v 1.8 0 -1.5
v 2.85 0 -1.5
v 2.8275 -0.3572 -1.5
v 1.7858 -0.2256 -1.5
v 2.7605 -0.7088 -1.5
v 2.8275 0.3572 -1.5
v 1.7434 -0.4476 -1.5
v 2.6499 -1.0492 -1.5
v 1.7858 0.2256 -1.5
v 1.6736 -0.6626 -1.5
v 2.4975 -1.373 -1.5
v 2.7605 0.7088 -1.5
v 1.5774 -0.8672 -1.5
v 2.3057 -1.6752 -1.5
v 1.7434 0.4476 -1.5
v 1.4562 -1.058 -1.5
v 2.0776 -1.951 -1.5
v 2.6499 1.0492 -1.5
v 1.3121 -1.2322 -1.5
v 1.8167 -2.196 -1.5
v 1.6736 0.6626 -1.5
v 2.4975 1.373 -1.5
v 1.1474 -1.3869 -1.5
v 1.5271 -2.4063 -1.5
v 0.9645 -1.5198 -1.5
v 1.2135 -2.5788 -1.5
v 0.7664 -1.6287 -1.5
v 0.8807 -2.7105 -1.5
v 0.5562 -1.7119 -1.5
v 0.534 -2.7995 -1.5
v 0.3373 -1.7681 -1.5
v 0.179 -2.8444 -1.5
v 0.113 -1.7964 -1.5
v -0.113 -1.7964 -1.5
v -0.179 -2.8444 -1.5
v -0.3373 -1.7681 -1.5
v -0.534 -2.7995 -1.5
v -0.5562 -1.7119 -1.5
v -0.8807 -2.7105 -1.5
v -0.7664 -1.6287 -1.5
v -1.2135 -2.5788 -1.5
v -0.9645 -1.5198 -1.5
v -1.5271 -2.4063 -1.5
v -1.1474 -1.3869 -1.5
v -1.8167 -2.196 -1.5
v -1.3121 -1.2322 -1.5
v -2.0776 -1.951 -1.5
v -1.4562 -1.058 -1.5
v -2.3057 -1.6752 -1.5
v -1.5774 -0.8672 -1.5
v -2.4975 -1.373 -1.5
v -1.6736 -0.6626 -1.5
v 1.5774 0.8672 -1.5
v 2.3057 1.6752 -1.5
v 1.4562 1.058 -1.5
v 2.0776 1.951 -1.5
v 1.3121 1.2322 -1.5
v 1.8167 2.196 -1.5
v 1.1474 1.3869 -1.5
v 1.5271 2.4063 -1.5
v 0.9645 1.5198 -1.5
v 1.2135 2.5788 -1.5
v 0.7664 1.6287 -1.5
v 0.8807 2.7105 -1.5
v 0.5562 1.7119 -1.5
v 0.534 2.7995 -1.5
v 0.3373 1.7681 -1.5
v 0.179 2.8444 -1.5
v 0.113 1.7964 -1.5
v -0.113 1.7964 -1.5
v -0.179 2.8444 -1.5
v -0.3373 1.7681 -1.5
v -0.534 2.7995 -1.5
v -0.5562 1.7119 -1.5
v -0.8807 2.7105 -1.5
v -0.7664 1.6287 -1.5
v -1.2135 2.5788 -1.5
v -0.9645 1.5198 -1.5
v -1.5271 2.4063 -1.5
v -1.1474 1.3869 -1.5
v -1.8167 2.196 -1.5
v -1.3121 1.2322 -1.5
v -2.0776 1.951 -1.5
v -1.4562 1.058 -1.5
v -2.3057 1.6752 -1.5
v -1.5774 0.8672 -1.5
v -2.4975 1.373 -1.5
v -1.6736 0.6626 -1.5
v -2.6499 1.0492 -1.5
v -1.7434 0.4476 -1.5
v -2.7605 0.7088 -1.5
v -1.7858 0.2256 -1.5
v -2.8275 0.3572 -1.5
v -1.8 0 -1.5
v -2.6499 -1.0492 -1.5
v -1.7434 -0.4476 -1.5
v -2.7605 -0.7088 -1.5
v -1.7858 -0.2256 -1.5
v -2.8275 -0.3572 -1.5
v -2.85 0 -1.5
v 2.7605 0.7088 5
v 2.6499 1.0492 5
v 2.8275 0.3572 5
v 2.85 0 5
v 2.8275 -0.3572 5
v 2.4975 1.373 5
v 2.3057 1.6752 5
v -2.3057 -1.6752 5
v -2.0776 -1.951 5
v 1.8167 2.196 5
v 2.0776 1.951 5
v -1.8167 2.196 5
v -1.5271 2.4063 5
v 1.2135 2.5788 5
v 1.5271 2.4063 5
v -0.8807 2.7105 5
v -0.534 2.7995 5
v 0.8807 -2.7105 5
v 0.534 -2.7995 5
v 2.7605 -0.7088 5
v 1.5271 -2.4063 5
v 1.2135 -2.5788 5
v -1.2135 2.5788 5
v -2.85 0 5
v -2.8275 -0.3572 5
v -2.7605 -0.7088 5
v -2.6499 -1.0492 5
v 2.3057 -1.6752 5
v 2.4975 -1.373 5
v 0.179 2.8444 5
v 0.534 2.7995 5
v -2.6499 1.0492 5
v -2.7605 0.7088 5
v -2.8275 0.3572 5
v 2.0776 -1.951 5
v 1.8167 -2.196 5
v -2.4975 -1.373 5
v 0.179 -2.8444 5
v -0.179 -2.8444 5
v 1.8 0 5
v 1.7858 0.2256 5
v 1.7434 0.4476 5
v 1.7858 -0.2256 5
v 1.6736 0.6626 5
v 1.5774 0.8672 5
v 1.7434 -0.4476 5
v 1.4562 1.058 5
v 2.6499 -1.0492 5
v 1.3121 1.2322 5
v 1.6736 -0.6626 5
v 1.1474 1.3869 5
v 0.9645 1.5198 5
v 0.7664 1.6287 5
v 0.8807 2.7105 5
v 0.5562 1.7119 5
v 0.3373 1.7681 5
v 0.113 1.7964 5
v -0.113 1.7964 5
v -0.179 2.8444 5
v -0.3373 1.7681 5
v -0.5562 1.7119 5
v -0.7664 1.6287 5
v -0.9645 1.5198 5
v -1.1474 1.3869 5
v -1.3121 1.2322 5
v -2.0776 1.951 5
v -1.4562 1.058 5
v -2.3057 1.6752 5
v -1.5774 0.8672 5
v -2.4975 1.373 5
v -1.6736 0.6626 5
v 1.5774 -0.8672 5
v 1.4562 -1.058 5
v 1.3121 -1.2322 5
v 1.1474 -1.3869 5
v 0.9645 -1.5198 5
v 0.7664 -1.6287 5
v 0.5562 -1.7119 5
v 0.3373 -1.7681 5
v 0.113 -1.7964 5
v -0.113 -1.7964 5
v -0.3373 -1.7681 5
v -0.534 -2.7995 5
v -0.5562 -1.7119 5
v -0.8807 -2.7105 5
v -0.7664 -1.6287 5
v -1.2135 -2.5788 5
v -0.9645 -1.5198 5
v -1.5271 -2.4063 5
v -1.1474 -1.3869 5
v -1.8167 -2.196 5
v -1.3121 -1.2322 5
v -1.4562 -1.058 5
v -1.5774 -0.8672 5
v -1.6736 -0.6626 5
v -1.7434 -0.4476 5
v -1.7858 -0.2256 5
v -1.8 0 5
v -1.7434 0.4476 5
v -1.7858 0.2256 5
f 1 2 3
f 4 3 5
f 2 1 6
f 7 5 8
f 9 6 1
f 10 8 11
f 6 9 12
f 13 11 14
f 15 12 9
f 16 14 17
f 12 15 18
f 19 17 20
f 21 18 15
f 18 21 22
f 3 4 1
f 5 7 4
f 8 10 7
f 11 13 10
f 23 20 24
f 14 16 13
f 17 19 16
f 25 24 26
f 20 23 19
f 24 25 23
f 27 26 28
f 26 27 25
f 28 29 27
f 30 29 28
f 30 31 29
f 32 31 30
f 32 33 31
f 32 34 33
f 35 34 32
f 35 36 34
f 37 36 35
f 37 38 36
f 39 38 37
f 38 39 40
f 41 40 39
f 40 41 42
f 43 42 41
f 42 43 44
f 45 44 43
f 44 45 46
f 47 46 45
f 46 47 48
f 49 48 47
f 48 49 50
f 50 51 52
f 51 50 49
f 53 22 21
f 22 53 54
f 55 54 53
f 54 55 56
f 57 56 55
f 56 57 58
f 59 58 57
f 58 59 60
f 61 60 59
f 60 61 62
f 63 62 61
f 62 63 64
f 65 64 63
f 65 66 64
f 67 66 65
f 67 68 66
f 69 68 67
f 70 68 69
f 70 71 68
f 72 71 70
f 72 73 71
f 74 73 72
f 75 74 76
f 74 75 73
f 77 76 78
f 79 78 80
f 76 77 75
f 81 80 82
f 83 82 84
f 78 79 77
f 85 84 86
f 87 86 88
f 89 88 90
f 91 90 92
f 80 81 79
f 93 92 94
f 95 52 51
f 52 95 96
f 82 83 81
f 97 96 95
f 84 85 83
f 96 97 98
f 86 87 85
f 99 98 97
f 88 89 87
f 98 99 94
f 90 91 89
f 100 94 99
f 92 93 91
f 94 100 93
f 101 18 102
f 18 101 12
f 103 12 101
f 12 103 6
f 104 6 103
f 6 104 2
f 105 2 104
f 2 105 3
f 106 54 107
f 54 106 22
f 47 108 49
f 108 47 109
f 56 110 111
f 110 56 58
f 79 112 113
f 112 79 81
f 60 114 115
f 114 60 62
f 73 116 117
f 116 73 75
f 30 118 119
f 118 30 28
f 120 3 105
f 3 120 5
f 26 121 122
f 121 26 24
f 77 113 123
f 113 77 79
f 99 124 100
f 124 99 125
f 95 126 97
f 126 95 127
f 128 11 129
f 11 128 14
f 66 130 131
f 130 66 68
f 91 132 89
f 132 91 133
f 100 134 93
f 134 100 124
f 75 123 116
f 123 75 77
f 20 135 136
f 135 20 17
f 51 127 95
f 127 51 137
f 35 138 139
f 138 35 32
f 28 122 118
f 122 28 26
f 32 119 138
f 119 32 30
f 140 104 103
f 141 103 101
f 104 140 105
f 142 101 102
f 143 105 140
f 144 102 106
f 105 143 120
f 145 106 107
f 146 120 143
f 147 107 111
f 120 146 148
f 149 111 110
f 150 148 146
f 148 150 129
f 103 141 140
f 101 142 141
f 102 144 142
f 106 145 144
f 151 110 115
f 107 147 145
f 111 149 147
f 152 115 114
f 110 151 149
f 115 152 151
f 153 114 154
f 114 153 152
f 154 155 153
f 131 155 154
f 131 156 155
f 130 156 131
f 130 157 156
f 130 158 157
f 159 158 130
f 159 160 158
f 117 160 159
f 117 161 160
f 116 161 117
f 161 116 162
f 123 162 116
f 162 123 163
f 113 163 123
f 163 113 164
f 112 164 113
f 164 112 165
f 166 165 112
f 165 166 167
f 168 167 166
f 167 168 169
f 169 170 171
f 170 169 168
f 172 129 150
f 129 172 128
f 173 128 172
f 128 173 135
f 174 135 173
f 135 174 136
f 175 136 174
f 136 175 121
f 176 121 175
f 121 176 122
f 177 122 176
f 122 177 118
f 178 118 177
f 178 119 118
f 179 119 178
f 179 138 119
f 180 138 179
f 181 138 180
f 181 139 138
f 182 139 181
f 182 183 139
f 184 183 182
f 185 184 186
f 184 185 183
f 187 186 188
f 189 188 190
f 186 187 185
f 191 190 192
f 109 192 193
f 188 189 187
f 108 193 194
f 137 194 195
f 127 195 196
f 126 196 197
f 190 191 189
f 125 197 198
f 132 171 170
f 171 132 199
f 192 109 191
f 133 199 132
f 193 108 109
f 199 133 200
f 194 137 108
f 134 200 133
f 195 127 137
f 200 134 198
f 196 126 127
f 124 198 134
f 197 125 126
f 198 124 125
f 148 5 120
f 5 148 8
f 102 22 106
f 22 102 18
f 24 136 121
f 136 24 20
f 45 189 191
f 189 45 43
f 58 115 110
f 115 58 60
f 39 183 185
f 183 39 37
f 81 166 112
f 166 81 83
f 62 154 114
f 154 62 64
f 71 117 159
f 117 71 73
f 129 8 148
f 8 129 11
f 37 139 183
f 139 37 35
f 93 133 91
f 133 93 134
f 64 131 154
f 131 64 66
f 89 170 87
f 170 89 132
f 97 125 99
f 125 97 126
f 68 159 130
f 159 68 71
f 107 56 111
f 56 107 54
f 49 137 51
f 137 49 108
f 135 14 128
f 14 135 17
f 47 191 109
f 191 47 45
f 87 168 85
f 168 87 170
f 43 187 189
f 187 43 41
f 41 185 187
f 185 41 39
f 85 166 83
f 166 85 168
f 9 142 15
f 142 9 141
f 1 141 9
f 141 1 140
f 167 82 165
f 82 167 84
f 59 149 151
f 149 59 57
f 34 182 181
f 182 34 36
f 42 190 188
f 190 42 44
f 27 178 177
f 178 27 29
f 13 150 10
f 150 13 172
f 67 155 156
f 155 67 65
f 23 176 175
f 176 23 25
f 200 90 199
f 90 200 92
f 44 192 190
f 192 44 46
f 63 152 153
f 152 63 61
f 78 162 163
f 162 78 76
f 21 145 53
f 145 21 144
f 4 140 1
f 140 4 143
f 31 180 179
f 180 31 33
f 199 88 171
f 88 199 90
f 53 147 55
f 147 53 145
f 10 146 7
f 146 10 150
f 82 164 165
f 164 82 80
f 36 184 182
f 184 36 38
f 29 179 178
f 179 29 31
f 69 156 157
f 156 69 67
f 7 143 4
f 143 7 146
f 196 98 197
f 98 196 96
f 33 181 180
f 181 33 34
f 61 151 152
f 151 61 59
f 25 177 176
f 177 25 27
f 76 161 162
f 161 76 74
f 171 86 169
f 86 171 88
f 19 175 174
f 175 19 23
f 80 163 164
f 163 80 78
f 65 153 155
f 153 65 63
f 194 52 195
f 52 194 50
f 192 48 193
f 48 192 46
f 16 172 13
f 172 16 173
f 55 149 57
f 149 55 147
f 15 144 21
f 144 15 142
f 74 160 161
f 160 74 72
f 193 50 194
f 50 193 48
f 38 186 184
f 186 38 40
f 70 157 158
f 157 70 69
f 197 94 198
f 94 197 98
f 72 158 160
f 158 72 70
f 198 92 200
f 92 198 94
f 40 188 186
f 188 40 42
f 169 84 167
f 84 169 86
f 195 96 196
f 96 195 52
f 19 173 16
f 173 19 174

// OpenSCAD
$fn = 50;


difference() {
	union() {
		translate(v = [0, 0, -1.5000000000]) {
			cylinder(h = 3, r = 1.0000000000);
		}
		translate(v = [0, 0, -1.5000000000]) {
			cylinder(h = 6.5000000000, r = 2.8500000000);
		}
	}
	union() {
		translate(v = [0, 0, -50.0000000000]) {
			cylinder(h = 100, r = 1.8000000000);
		}
	}
}
